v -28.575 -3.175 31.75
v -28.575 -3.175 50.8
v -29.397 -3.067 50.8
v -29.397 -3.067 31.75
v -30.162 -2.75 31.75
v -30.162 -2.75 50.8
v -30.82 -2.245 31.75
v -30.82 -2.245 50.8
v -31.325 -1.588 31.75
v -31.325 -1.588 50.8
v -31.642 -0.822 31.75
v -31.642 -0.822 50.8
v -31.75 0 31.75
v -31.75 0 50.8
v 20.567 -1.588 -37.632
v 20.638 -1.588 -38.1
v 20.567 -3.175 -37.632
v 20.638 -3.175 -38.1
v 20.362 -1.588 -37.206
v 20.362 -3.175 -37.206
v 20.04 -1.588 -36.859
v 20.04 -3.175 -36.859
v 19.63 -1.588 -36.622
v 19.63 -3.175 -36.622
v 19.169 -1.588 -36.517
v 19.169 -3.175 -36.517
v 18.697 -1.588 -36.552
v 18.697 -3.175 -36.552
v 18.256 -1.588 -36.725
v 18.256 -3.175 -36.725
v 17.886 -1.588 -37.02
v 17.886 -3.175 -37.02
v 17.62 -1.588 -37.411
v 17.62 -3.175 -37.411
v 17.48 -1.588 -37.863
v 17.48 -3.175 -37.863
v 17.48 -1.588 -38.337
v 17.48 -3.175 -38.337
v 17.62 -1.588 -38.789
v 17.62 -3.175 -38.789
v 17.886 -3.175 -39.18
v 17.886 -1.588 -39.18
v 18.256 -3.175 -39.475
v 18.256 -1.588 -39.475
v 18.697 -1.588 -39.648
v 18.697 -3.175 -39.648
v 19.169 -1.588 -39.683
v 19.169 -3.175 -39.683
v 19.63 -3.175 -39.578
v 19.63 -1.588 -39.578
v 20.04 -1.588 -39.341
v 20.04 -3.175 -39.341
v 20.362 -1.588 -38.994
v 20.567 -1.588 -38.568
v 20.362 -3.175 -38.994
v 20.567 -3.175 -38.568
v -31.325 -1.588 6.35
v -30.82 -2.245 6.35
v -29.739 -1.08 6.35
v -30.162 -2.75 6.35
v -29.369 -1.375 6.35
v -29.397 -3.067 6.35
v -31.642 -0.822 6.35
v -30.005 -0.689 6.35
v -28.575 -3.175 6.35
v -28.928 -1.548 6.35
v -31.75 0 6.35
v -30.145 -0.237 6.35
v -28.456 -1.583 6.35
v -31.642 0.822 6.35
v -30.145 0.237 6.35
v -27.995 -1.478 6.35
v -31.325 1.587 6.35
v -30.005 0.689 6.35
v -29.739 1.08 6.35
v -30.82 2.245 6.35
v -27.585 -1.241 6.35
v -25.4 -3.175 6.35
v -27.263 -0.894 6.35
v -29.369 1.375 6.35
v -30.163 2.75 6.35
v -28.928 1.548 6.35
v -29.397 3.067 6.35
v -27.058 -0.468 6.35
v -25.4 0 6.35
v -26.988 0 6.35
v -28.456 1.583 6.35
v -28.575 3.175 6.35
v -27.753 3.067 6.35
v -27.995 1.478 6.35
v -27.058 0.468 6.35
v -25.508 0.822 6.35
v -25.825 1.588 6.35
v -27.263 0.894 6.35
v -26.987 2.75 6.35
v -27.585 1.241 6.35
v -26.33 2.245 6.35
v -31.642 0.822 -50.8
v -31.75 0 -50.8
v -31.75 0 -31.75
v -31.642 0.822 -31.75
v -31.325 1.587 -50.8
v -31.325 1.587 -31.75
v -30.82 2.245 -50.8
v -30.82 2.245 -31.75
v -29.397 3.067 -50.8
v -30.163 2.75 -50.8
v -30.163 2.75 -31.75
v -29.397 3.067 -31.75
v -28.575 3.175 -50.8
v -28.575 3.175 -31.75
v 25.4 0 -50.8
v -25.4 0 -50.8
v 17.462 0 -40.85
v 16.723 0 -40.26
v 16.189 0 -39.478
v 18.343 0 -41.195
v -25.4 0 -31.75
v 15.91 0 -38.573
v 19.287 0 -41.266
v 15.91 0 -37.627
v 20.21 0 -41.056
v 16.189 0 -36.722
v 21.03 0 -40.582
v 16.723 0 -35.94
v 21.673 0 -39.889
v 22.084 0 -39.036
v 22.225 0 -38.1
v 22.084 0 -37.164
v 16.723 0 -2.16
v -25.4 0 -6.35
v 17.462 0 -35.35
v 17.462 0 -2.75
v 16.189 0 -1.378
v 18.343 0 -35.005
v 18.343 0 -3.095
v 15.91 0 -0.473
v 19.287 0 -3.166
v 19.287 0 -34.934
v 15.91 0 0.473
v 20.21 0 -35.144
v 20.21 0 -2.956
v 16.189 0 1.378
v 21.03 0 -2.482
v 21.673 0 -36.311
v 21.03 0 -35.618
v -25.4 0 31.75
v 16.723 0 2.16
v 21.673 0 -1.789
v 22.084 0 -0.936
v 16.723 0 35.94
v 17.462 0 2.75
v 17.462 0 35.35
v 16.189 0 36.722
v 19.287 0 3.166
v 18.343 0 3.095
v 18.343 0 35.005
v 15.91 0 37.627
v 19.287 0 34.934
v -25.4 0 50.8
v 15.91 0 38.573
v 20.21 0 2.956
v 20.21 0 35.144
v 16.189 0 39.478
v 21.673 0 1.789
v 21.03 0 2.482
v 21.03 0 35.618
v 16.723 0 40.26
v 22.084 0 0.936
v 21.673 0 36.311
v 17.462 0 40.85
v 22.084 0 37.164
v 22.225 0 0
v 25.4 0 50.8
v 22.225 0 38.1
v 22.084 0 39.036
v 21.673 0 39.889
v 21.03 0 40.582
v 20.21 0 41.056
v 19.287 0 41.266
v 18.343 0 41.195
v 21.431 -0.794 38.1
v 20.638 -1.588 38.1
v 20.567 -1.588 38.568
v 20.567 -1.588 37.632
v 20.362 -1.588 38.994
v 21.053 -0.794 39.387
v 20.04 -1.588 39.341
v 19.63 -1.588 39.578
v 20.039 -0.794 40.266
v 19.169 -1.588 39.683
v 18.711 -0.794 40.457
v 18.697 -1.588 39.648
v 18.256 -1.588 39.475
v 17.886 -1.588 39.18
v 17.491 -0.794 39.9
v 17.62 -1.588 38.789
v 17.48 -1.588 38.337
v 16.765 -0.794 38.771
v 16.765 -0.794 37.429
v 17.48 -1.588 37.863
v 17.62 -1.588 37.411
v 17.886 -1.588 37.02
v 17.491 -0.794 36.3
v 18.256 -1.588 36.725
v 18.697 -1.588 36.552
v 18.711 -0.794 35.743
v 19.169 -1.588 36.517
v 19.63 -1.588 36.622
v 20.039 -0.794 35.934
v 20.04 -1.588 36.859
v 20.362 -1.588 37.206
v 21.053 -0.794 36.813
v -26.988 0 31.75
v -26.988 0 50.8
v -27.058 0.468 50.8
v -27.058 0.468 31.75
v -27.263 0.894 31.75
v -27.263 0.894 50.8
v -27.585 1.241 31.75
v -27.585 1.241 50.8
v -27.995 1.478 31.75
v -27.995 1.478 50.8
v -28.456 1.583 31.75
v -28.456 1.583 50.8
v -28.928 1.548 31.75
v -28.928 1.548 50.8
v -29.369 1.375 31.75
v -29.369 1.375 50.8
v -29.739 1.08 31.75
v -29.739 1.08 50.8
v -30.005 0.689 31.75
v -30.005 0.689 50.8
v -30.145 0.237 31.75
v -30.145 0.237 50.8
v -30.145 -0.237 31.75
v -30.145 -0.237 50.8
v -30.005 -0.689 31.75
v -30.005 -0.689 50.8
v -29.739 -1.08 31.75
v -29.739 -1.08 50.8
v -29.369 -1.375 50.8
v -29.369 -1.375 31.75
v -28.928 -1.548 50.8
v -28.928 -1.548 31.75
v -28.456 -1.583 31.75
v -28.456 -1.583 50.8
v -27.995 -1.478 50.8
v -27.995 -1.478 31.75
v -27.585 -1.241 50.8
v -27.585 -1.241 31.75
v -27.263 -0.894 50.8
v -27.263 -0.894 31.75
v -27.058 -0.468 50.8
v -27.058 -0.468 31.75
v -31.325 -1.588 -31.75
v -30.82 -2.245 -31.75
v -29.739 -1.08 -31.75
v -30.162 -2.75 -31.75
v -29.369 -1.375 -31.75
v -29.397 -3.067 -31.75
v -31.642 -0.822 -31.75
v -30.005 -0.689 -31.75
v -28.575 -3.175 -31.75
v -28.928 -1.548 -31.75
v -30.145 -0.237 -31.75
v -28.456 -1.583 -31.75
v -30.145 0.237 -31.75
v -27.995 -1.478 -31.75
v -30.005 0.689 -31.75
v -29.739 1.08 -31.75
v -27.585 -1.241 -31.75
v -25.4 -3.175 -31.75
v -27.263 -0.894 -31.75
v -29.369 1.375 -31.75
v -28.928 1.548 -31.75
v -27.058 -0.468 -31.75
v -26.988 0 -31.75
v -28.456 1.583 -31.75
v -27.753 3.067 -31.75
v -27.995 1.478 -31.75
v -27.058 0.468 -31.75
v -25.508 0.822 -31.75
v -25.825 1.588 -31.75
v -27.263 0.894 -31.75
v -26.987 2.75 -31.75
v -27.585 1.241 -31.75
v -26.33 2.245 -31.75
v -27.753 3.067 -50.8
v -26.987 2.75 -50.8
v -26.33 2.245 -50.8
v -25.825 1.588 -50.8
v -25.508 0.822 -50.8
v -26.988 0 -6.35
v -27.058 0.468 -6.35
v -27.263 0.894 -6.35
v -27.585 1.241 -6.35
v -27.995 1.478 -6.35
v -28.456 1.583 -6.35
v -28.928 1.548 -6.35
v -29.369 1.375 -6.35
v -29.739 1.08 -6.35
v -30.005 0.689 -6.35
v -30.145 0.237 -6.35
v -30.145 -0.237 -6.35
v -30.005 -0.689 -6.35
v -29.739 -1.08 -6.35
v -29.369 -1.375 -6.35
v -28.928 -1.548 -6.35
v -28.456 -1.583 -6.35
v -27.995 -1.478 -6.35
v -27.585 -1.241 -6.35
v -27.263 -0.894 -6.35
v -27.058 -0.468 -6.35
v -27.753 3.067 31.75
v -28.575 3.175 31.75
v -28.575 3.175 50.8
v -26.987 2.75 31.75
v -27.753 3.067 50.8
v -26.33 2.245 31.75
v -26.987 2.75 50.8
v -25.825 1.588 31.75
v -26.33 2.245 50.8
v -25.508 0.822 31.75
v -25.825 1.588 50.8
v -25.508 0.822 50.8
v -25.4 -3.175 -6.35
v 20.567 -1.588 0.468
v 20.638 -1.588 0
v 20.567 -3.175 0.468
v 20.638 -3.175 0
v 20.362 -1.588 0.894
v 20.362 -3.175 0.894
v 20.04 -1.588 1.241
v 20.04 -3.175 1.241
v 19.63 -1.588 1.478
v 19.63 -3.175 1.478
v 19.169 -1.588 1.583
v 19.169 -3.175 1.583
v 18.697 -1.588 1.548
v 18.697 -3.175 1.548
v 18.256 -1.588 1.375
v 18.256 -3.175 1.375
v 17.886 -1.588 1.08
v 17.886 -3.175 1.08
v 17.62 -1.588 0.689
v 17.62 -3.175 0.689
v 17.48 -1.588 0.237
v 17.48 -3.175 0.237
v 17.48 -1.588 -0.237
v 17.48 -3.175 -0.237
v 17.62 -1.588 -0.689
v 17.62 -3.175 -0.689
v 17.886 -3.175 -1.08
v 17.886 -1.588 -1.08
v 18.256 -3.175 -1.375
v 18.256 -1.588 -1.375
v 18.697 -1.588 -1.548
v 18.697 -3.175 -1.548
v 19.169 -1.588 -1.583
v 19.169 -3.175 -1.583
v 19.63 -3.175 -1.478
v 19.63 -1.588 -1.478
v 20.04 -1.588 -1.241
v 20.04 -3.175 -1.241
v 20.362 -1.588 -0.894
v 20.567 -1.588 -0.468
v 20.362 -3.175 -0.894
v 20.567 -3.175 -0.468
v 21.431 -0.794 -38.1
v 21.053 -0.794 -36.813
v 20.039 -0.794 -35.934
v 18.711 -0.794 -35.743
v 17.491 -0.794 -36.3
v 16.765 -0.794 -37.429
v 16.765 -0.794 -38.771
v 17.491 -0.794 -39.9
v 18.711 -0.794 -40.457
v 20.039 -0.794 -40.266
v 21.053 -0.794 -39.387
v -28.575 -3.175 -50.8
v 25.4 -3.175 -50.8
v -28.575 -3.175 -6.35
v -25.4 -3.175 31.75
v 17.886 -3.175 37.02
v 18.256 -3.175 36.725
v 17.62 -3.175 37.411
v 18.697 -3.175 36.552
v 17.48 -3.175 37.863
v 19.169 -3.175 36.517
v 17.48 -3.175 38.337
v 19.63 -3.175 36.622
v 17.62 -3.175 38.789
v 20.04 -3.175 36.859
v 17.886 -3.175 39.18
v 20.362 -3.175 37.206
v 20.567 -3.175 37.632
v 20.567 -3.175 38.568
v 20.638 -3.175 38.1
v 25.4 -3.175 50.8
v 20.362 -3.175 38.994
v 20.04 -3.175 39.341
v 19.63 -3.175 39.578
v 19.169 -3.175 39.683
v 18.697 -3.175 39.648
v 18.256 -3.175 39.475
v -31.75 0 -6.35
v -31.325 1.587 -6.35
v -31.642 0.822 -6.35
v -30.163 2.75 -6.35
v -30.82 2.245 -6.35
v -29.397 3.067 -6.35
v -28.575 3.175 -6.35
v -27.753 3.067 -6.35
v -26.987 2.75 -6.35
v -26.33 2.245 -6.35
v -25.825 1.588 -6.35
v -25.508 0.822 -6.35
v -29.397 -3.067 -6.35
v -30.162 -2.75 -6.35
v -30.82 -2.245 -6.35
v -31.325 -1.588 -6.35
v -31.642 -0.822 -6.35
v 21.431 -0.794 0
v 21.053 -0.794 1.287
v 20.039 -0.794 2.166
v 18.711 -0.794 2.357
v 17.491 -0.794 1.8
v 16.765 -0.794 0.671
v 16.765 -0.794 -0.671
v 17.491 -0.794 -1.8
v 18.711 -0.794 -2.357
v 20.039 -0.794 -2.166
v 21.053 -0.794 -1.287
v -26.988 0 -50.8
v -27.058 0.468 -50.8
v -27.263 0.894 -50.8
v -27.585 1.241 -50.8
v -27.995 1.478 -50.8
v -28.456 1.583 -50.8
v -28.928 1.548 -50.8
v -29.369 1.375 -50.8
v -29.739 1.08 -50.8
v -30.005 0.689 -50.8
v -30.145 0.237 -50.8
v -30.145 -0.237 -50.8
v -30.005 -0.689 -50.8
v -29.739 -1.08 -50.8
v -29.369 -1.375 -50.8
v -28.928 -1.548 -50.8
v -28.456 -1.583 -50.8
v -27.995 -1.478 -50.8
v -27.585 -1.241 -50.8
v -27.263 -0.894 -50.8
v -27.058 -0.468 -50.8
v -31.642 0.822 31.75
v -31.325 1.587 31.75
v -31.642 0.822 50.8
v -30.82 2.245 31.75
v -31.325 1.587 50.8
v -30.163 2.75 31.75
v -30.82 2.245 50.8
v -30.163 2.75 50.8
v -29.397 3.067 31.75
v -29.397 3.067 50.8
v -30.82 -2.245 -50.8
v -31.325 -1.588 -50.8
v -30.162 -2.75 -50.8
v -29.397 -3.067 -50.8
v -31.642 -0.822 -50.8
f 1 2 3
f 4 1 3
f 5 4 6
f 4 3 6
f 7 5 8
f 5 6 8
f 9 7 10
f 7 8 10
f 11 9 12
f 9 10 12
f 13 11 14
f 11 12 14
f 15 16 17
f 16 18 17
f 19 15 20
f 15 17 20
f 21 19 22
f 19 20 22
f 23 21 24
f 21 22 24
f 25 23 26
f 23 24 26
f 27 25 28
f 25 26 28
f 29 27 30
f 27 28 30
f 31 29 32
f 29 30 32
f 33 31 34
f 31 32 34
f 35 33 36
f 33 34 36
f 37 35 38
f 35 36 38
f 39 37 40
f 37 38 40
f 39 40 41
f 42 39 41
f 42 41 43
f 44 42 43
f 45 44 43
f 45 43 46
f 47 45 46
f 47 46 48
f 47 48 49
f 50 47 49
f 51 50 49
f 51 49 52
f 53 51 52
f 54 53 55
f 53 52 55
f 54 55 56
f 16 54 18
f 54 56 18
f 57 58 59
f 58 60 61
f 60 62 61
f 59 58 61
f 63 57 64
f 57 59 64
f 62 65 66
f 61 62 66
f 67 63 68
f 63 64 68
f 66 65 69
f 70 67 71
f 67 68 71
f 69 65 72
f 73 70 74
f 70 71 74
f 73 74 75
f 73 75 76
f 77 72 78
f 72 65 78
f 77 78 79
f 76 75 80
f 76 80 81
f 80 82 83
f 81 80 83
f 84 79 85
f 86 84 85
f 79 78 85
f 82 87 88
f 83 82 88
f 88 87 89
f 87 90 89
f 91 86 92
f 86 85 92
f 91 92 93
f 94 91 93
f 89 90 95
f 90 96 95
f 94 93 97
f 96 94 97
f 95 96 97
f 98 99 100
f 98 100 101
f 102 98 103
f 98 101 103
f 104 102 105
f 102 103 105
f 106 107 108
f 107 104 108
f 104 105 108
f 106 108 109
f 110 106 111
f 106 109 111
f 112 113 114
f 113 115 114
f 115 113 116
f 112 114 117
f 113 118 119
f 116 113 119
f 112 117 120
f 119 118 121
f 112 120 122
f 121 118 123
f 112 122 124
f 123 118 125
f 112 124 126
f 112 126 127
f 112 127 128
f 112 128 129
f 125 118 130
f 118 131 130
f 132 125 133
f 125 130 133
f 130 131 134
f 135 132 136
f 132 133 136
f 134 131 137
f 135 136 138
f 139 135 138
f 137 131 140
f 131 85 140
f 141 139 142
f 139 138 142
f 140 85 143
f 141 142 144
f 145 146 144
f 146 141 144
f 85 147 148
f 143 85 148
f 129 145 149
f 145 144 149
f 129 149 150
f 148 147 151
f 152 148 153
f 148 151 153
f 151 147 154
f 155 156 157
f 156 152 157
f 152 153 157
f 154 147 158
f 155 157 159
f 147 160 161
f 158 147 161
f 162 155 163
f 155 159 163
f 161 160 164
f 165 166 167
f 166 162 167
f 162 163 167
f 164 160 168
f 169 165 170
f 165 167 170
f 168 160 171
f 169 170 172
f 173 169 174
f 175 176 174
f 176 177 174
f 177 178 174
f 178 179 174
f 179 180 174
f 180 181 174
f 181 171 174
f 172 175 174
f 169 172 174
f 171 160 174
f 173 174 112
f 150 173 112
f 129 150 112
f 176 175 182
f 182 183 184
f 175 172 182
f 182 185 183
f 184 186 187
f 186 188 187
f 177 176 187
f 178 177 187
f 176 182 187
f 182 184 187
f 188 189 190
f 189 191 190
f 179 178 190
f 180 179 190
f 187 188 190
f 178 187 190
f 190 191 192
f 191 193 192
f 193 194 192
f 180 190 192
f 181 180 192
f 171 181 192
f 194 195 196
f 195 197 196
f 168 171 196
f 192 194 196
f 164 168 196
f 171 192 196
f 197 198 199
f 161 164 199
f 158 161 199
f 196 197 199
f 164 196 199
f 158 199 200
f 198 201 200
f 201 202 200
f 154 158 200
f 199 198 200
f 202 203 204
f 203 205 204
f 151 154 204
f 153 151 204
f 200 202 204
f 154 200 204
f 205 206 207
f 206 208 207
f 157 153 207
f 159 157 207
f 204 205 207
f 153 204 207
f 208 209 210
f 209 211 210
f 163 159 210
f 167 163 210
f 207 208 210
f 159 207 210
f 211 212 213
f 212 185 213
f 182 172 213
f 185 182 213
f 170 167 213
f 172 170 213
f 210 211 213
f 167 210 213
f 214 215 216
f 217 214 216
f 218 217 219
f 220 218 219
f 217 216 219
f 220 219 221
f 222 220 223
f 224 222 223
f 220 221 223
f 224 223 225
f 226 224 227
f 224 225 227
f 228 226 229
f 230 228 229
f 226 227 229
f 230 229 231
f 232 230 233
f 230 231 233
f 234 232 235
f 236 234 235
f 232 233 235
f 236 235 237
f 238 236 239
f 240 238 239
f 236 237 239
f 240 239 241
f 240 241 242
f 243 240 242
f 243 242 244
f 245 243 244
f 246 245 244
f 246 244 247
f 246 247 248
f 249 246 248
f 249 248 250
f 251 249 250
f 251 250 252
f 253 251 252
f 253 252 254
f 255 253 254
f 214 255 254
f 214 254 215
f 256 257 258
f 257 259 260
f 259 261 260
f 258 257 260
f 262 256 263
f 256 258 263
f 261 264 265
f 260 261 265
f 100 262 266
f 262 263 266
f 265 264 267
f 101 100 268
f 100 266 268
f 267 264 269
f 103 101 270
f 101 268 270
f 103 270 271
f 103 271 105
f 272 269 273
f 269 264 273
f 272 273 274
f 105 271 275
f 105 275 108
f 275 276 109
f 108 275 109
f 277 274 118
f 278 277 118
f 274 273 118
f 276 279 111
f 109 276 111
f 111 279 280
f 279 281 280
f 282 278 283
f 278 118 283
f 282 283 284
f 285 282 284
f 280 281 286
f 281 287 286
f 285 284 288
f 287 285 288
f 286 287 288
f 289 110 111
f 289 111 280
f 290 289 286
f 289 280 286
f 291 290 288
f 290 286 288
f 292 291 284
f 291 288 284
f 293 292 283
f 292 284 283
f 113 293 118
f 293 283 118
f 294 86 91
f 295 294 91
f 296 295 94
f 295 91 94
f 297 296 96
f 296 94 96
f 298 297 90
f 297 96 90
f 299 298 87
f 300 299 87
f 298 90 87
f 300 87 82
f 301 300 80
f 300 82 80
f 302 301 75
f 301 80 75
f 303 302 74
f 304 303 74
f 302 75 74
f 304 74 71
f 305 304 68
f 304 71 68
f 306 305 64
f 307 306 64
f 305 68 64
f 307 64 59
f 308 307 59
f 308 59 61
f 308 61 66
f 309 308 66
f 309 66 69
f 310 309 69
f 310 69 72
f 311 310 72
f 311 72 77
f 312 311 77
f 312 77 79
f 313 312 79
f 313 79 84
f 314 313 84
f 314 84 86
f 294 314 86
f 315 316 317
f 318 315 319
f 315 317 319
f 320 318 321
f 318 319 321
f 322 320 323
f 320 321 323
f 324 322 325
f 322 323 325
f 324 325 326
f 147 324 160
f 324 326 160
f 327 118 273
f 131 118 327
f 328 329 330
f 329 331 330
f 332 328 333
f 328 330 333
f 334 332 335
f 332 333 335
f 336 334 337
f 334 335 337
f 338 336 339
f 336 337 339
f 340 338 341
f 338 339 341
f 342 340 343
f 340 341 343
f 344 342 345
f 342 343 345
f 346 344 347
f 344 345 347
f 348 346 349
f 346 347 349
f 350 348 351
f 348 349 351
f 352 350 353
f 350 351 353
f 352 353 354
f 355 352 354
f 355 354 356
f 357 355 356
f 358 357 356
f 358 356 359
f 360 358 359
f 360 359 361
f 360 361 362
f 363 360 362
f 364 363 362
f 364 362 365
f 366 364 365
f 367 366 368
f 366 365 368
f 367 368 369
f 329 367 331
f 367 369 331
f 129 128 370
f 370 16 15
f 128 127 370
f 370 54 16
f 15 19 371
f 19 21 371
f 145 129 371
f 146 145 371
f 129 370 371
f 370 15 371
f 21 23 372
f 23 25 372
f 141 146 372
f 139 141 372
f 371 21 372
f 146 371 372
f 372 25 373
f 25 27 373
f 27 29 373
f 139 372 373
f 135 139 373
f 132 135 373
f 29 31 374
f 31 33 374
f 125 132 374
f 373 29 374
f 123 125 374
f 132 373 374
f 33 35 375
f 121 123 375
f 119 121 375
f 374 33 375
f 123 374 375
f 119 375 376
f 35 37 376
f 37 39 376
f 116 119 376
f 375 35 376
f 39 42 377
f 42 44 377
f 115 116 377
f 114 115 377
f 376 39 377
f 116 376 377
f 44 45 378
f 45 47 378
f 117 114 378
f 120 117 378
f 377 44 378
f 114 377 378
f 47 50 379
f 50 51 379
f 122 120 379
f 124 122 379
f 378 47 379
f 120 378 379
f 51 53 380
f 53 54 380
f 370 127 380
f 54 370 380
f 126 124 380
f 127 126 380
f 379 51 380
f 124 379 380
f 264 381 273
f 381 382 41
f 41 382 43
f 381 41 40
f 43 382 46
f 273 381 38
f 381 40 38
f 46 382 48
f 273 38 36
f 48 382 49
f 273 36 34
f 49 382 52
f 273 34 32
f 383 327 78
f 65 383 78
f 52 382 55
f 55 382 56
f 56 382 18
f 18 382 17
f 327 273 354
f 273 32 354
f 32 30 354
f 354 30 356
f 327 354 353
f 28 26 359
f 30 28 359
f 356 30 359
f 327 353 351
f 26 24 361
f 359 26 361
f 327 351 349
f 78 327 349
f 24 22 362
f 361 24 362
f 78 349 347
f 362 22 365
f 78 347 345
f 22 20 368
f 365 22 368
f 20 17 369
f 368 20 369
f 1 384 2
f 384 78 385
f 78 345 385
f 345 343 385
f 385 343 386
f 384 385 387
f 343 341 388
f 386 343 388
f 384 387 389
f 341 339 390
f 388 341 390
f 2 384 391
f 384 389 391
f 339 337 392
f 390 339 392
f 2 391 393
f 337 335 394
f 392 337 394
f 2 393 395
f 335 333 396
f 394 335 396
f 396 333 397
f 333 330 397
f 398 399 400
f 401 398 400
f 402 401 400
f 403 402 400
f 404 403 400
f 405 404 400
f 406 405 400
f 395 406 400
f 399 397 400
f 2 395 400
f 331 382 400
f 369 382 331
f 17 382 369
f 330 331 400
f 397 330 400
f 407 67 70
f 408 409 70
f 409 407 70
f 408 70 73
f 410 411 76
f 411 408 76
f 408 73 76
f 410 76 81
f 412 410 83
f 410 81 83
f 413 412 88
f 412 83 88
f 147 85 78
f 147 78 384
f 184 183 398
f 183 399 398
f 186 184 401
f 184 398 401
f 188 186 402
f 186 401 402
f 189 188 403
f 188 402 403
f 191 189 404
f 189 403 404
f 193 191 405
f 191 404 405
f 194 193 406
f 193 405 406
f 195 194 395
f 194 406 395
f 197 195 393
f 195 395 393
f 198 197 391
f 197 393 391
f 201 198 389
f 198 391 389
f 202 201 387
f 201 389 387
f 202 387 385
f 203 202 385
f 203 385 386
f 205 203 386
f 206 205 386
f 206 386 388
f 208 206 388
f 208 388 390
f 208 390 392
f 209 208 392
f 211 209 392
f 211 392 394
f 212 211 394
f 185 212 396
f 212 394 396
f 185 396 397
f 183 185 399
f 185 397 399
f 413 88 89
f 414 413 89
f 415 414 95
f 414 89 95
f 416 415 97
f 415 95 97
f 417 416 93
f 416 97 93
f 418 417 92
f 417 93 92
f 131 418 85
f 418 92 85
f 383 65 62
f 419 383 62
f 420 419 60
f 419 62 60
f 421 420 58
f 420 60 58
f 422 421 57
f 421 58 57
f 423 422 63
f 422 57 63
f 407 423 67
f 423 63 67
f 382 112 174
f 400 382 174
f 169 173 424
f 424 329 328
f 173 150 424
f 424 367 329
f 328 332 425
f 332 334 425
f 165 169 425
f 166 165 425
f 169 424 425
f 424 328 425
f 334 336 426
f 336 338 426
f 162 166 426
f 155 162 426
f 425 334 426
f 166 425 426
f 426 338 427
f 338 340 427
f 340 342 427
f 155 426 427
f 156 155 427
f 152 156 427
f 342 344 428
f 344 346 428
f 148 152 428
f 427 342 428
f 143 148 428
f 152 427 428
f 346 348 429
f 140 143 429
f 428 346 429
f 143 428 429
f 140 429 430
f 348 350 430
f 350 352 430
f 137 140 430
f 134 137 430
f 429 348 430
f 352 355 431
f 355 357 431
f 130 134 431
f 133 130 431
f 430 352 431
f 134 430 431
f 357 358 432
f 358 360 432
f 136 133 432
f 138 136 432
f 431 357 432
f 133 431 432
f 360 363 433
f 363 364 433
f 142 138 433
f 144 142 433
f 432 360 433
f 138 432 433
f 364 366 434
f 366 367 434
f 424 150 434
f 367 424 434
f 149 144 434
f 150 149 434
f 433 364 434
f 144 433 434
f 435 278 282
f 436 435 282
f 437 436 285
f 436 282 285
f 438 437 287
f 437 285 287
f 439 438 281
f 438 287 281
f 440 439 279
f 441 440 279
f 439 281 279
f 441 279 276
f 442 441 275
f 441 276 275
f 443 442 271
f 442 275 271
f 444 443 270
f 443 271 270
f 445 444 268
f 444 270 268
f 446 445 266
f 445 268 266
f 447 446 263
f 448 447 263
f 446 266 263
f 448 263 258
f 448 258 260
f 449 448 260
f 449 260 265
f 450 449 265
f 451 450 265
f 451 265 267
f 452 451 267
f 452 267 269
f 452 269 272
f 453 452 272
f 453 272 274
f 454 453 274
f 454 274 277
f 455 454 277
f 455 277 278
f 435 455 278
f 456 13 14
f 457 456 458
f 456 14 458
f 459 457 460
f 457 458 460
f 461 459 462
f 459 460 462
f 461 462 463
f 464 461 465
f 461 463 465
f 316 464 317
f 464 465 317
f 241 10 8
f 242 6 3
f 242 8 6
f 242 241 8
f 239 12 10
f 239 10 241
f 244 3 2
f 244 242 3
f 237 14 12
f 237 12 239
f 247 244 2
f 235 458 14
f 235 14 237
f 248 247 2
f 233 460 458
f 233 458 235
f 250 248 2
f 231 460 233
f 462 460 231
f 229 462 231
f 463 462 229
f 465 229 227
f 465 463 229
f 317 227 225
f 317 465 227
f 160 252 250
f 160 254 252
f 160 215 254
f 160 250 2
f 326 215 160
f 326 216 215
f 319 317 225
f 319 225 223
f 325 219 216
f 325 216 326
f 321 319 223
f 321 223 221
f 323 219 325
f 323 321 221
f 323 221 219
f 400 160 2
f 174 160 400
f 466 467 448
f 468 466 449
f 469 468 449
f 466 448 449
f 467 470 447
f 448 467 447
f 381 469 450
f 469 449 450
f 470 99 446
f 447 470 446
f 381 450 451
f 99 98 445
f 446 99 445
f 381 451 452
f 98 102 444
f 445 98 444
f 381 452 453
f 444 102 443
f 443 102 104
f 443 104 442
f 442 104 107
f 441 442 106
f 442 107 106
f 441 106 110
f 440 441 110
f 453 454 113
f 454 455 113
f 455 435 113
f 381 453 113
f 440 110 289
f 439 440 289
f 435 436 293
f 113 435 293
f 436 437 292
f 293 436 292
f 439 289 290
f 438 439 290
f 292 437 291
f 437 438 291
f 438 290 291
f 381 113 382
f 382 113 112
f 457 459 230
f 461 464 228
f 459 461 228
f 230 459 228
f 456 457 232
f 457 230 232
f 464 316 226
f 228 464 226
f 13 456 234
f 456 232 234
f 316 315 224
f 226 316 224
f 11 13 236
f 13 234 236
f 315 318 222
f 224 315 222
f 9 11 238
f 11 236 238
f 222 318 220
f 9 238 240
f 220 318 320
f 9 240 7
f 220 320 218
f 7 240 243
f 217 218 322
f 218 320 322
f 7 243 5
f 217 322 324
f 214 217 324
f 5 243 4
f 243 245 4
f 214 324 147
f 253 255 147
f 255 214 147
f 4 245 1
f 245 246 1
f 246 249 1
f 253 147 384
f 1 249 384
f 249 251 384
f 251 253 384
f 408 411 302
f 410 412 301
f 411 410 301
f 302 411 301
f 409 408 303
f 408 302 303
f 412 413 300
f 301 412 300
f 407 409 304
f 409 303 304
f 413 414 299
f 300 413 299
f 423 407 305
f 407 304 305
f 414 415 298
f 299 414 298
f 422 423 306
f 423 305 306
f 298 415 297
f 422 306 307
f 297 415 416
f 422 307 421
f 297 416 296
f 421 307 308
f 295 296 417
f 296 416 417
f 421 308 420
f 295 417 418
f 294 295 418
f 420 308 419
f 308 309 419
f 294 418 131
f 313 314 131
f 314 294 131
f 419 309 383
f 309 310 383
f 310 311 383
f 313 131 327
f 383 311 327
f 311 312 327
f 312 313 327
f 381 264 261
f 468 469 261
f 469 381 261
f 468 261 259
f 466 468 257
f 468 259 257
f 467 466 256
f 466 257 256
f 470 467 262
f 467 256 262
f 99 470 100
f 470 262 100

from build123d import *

# Parameters (mm, degrees)
F0_W           = 50.8
F0_H           = 101.6
F1_DEPTH       = 3.175
F2_W           = 3.175
F2_H           = 12.7
F2_H_2         = 19.05
F3_DEPTH       = 6.35
F5_DEPTH       = 101.601
F6_R           = 1.5875
F7_DEPTH       = 101.601
F9_D           = 3.175
F9_CSINK_D     = 6.35
F9_CSINK_ANGLE = 90


with BuildPart() as f1:
    # F0 (on Front) → F1 (new body)
    with BuildSketch(Plane.XZ):
        Rectangle(F0_W, F0_H)
    extrude(amount=F1_DEPTH)

    # F2 (on face) → F3 (join)
    with BuildSketch(Plane(origin=(-25.4, 0, 0), x_dir=(0, -1, 0), z_dir=(-1, 0, 0))):
        with Locations((-1.5875, 0)):
            Rectangle(F2_W, F2_H)
        with Locations((-1.5875, -41.275)):
            Rectangle(F2_W, F2_H_2)
        with Locations((1.5875, 41.275)):
            Rectangle(F2_W, F2_H_2)
        with Locations((1.5875, -41.275)):
            Rectangle(F2_W, F2_H_2)
        with Locations((1.5875, 0)):
            Rectangle(F2_W, F2_H)
        with Locations((-1.5875, 41.275)):
            Rectangle(F2_W, F2_H_2)
    extrude(amount=F3_DEPTH)

    # F4 (on face) → F5 (cut, through all)
    with BuildSketch(Plane.XY.offset(50.8)):
        with BuildLine():
            ThreePointArc((-31.75, -3.5e-09), (-30.8200640315, 2.245064029), (-28.575, 3.175))
            Line((-28.575, 3.175), (-31.75, 3.175))
            Line((-31.75, 3.175), (-31.75, -3.5e-09))
        make_face()
        with BuildLine():
            ThreePointArc((-28.575, 3.175), (-26.3299359697, 2.2450640303), (-25.4, 0))
            Line((-25.4, 0), (-25.4, 3.175))
            Line((-25.4, 3.175), (-28.575, 3.175))
        make_face()
        with BuildLine():
            Line((-31.75, -3.175), (-28.575, -3.175))
            ThreePointArc((-28.575, -3.175), (-30.820064029, -2.2450640315), (-31.75, -3.5e-09))
            Line((-31.75, -3.5e-09), (-31.75, -3.175))
        make_face()
    extrude(amount=-F5_DEPTH, mode=Mode.SUBTRACT)

    # F6 (on face) → F7 (cut, through all)
    with BuildSketch(Plane.XY.offset(50.8)):
        with Locations((-28.575, 0)):
            Circle(F6_R)
    extrude(amount=-F7_DEPTH, mode=Mode.SUBTRACT)

    # F9 (through all)
    with Locations(Plane(origin=(0, 0, 0), x_dir=(-1, 0, 0), z_dir=(0, 1, 0))):
        with Locations((-19.05, 38.1), (-19.05, 0), (-19.05, -38.1)):
            CounterSinkHole(F9_D / 2, F9_CSINK_D / 2, counter_sink_angle=F9_CSINK_ANGLE)


solid = f1.part
